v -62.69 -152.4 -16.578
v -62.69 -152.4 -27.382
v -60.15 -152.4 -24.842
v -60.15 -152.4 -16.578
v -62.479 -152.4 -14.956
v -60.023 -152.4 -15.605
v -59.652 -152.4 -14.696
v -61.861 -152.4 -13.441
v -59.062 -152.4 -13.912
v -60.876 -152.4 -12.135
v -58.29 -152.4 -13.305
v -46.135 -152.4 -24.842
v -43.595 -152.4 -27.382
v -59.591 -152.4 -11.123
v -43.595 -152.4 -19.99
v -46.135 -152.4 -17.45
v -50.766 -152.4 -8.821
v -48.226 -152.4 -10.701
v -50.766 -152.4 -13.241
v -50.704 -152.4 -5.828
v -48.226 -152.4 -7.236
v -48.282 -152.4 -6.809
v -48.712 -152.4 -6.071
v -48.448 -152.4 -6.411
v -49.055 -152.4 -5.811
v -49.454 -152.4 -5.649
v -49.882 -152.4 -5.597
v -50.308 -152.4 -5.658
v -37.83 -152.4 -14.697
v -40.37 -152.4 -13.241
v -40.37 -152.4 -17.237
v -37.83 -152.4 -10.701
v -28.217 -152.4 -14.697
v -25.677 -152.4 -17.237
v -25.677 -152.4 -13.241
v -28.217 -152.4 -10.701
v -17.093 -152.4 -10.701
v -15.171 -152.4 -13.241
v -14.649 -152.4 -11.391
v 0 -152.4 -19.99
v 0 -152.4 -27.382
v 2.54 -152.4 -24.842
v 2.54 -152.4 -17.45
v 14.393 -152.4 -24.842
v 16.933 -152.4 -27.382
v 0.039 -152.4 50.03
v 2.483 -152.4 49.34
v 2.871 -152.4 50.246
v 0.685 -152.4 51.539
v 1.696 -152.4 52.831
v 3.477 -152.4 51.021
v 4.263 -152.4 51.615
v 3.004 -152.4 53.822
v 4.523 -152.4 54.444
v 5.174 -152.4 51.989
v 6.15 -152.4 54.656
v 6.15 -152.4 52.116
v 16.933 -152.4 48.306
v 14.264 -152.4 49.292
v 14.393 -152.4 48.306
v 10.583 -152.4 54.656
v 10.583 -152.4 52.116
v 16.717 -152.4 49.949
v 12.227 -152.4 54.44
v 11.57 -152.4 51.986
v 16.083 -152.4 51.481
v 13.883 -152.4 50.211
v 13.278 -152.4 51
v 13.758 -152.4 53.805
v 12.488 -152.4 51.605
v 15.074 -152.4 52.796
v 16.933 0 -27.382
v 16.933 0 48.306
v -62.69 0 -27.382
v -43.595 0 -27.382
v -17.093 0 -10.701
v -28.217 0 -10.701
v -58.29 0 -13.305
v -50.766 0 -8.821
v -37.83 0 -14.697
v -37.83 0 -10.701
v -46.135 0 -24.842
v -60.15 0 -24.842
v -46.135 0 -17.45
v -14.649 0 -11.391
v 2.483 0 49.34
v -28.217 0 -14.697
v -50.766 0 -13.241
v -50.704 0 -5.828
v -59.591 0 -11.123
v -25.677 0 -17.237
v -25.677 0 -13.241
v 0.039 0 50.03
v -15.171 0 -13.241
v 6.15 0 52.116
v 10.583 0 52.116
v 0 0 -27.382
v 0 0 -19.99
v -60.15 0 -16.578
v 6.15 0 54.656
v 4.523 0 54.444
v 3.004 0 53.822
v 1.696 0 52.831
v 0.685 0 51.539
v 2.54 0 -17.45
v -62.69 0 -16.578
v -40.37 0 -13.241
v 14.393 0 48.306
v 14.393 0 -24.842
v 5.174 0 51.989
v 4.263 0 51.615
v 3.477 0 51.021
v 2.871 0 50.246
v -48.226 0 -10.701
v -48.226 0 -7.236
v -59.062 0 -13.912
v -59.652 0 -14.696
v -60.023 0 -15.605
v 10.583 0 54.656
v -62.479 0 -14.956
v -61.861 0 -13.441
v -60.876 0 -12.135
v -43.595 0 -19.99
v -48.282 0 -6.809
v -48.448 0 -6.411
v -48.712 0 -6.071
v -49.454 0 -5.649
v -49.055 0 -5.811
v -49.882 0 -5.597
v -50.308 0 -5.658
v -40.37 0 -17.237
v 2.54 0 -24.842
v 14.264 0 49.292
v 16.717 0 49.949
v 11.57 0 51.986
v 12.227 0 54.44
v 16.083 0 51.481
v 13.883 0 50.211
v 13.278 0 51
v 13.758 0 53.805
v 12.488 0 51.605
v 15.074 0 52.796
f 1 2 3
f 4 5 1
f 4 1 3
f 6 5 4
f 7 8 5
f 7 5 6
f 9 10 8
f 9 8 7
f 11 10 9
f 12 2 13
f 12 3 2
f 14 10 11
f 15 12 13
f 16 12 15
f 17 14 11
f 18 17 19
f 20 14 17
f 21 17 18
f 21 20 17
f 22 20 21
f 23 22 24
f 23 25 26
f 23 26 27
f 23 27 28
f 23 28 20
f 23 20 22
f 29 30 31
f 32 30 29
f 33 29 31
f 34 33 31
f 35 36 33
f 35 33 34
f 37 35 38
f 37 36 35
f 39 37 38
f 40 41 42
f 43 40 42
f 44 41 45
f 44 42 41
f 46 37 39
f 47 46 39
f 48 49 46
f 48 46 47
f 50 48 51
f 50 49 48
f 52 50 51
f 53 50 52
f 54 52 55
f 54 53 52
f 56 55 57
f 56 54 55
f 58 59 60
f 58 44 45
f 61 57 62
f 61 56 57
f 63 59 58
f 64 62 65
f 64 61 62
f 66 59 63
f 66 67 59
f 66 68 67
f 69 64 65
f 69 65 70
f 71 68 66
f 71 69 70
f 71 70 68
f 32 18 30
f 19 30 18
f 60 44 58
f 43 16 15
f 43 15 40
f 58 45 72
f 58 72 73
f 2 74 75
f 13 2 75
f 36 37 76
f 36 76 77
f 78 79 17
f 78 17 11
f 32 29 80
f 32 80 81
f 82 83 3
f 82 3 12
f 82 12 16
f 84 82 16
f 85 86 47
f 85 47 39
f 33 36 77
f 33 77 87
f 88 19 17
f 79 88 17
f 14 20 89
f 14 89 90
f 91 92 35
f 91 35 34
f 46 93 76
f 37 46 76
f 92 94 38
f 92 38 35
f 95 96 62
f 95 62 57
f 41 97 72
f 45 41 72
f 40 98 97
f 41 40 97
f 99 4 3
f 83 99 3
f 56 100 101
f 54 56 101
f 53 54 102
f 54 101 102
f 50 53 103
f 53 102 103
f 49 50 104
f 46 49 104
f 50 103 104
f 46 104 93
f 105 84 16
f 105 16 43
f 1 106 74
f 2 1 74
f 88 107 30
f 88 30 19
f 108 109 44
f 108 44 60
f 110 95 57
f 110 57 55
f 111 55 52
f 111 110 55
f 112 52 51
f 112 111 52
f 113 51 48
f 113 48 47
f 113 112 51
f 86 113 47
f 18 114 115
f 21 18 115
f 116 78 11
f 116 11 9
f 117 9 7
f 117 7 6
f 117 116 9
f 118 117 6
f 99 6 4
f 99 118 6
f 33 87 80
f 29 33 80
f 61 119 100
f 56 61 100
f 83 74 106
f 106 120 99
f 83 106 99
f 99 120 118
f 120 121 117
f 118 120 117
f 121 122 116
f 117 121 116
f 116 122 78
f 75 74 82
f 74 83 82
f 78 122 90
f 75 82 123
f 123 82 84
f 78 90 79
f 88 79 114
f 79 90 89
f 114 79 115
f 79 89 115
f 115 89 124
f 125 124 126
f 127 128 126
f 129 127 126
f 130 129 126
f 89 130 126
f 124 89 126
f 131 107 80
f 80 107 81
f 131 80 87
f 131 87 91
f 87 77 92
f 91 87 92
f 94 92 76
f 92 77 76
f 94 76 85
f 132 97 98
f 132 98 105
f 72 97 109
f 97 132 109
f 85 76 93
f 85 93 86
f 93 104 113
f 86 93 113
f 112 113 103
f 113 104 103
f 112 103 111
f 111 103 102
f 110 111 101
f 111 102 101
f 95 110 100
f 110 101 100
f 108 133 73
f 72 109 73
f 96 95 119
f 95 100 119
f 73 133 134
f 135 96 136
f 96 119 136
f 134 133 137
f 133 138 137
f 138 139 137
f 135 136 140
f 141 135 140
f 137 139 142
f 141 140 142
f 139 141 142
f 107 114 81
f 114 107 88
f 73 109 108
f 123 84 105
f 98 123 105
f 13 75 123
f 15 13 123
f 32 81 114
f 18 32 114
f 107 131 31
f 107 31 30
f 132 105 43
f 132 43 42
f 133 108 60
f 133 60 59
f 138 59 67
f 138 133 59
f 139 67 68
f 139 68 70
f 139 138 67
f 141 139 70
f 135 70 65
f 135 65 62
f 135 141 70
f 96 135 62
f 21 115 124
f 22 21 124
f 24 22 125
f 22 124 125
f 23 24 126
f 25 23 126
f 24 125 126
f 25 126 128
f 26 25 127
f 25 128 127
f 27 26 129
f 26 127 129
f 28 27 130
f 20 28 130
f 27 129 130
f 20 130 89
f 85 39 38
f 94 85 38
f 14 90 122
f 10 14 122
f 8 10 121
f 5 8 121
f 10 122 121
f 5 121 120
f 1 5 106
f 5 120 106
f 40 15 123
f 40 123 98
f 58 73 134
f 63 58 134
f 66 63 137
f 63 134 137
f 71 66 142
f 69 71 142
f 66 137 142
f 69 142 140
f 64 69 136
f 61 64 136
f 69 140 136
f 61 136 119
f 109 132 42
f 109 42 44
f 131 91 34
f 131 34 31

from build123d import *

# Parameters (mm, degrees)
F1_DEPTH    = 152.4
F2_T        = 2.54
F2_T3_DEPTH = 157.48


# Not quite as in the source:
# - a shell that OpenCascade refuses in one call is made with other operations: the cavity is built on its own and cut out


with BuildPart() as f1:
    # F0 (on Front) → F1 (new body)
    with BuildSketch(Plane.XZ):
        with BuildLine():
            Line((-37.8300789744, -10.7009902054), (-48.2259040094, -10.7009902054))
            Line((-48.2259040094, -10.7009902054), (-48.2259040094, -7.2357404328))
            ThreePointArc((-48.2259040094, -7.2357404328), (-49.0552526275, -5.8106548767), (-50.7040085729, -5.8277371868))
            Line((-50.7040085729, -5.8277371868), (-59.5905011949, -11.123357617))
            ThreePointArc((-59.5905011949, -11.123357617), (-61.8609001823, -13.4412951055), (-62.6898407936, -16.578236805))
            Line((-62.6898407936, -16.578236805), (-62.6898407936, -27.3817684501))
            Line((-62.6898407936, -27.3817684501), (-43.5946621001, -27.3817684501))
            Line((-43.5946621001, -27.3817684501), (-43.5946621001, -19.9903684501))
            Line((-43.5946621001, -19.9903684501), (0, -19.9903684501))
            Line((0, -19.9903684501), (0, -27.3817684501))
            Line((0, -27.3817684501), (16.9334635139, -27.3817684501))
            Line((16.9334635139, -27.3817684501), (16.9334635139, 48.305941894))
            ThreePointArc((16.9334635139, 48.305941894), (15.0735915744, 52.7960699546), (10.5834635139, 54.655941894))
            Line((10.5834635139, 54.655941894), (6.1501904505, 54.655941894))
            ThreePointArc((6.1501904505, 54.655941894), (2.3177679163, 53.3690474153), (0.0387070827, 50.0299694591))
            Line((0.0387070827, 50.0299694591), (-17.0932790838, -10.7009902054))
            Line((-17.0932790838, -10.7009902054), (-28.2165445387, -10.7009902054))
            Line((-28.2165445387, -10.7009902054), (-28.2165445387, -14.6972788498))
            Line((-28.2165445387, -14.6972788498), (-37.8300789744, -14.6972788498))
            Line((-37.8300789744, -14.6972788498), (-37.8300789744, -10.7009902054))
        make_face()
    extrude(amount=F1_DEPTH)

    # F2: shell of thickness 2.54, made by hand


with BuildPart() as f2_core1:
    # F2_t2: copy of F1
    add(f1.part)

    # the walls: a layer under each face that stays
    f2_faces = [f2_core1.faces().sort_by_distance(p)[0] for p in [
        (-8.5272860005, -76.2, 19.6644896269),
        (-22.6549118113, -76.2, -10.7009902054),
        (-28.2165445387, -76.2, -12.6991345276),
        (-33.0233117566, -76.2, -14.6972788498),
        (-37.8300789744, -76.2, -12.6991345276),
        (-43.0279914919, -76.2, -10.7009902054),
        (-48.2259040094, -76.2, -8.9683653191),
        (-55.1472548839, -76.2, -8.4755474019),
        (-61.8609001823, -76.2, -13.4412951055),
        (-62.6898407936, -76.2, -21.9800026276),
        (-53.1422514468, -76.2, -27.3817684501),
        (-43.5946621001, -76.2, -23.6860684501),
        (-21.79733105, -76.2, -19.9903684501),
        (0, -76.2, -23.6860684501),
        (8.4667317569, -76.2, -27.3817684501),
        (16.9334635139, -76.2, 10.4620867219),
        (15.0735915744, -76.2, 52.7960699546),
        (8.3668269822, -76.2, 54.655941894),
        (2.3177679163, -76.2, 53.3690474153),
    ]]
    thicken(f2_faces, amount=-F2_T, mode=Mode.SUBTRACT)

    # F2_s4 → F2_t3 (cut)
    with BuildSketch(Plane.XZ.offset(-2.54)):
        Polygon((-17.1177250172, -10.6686940951), (-14.6486857366, -11.3906012314), (-15.1706738376, -13.2409902054), (-17.0932790838, -13.2409902054), align=None)
        Polygon((-28.2419445387, -14.6718788498), (-25.6765445387, -14.6972788498), (-25.6765445387, -17.2372788498), (-28.2165445387, -17.2372788498), align=None)
        Polygon((-37.8046789744, -14.6718788498), (-37.8300789744, -17.2372788498), (-40.3700789744, -17.2372788498), (-40.3700789744, -14.6972788498), align=None)
        Polygon((-48.2005040094, -10.6755902054), (-48.2259040094, -13.2409902054), (-50.7659040094, -13.2409902054), (-50.7659040094, -10.7009902054), align=None)
        Polygon((-43.5692621001, -20.0157684501), (-46.1346621001, -19.9903684501), (-46.1346621001, -17.4503684501), (-43.5946621001, -17.4503684501), align=None)
        Polygon((-0.0254, -20.0157684501), (0, -17.4503684501), (2.54, -17.4503684501), (2.54, -19.9903684501), align=None)
    extrude(amount=F2_T3_DEPTH, mode=Mode.SUBTRACT)


with BuildPart() as f1_1:
    add(f1.part)

    # what is left inside the walls is the cavity
    f2_cavity = [f2_core1.part.solids().sort_by_distance(p)[0] for p in [
        (14.368064, -101.6, 11.732087),
    ]]
    add(f2_cavity, mode=Mode.SUBTRACT)


solid = f1_1.part
